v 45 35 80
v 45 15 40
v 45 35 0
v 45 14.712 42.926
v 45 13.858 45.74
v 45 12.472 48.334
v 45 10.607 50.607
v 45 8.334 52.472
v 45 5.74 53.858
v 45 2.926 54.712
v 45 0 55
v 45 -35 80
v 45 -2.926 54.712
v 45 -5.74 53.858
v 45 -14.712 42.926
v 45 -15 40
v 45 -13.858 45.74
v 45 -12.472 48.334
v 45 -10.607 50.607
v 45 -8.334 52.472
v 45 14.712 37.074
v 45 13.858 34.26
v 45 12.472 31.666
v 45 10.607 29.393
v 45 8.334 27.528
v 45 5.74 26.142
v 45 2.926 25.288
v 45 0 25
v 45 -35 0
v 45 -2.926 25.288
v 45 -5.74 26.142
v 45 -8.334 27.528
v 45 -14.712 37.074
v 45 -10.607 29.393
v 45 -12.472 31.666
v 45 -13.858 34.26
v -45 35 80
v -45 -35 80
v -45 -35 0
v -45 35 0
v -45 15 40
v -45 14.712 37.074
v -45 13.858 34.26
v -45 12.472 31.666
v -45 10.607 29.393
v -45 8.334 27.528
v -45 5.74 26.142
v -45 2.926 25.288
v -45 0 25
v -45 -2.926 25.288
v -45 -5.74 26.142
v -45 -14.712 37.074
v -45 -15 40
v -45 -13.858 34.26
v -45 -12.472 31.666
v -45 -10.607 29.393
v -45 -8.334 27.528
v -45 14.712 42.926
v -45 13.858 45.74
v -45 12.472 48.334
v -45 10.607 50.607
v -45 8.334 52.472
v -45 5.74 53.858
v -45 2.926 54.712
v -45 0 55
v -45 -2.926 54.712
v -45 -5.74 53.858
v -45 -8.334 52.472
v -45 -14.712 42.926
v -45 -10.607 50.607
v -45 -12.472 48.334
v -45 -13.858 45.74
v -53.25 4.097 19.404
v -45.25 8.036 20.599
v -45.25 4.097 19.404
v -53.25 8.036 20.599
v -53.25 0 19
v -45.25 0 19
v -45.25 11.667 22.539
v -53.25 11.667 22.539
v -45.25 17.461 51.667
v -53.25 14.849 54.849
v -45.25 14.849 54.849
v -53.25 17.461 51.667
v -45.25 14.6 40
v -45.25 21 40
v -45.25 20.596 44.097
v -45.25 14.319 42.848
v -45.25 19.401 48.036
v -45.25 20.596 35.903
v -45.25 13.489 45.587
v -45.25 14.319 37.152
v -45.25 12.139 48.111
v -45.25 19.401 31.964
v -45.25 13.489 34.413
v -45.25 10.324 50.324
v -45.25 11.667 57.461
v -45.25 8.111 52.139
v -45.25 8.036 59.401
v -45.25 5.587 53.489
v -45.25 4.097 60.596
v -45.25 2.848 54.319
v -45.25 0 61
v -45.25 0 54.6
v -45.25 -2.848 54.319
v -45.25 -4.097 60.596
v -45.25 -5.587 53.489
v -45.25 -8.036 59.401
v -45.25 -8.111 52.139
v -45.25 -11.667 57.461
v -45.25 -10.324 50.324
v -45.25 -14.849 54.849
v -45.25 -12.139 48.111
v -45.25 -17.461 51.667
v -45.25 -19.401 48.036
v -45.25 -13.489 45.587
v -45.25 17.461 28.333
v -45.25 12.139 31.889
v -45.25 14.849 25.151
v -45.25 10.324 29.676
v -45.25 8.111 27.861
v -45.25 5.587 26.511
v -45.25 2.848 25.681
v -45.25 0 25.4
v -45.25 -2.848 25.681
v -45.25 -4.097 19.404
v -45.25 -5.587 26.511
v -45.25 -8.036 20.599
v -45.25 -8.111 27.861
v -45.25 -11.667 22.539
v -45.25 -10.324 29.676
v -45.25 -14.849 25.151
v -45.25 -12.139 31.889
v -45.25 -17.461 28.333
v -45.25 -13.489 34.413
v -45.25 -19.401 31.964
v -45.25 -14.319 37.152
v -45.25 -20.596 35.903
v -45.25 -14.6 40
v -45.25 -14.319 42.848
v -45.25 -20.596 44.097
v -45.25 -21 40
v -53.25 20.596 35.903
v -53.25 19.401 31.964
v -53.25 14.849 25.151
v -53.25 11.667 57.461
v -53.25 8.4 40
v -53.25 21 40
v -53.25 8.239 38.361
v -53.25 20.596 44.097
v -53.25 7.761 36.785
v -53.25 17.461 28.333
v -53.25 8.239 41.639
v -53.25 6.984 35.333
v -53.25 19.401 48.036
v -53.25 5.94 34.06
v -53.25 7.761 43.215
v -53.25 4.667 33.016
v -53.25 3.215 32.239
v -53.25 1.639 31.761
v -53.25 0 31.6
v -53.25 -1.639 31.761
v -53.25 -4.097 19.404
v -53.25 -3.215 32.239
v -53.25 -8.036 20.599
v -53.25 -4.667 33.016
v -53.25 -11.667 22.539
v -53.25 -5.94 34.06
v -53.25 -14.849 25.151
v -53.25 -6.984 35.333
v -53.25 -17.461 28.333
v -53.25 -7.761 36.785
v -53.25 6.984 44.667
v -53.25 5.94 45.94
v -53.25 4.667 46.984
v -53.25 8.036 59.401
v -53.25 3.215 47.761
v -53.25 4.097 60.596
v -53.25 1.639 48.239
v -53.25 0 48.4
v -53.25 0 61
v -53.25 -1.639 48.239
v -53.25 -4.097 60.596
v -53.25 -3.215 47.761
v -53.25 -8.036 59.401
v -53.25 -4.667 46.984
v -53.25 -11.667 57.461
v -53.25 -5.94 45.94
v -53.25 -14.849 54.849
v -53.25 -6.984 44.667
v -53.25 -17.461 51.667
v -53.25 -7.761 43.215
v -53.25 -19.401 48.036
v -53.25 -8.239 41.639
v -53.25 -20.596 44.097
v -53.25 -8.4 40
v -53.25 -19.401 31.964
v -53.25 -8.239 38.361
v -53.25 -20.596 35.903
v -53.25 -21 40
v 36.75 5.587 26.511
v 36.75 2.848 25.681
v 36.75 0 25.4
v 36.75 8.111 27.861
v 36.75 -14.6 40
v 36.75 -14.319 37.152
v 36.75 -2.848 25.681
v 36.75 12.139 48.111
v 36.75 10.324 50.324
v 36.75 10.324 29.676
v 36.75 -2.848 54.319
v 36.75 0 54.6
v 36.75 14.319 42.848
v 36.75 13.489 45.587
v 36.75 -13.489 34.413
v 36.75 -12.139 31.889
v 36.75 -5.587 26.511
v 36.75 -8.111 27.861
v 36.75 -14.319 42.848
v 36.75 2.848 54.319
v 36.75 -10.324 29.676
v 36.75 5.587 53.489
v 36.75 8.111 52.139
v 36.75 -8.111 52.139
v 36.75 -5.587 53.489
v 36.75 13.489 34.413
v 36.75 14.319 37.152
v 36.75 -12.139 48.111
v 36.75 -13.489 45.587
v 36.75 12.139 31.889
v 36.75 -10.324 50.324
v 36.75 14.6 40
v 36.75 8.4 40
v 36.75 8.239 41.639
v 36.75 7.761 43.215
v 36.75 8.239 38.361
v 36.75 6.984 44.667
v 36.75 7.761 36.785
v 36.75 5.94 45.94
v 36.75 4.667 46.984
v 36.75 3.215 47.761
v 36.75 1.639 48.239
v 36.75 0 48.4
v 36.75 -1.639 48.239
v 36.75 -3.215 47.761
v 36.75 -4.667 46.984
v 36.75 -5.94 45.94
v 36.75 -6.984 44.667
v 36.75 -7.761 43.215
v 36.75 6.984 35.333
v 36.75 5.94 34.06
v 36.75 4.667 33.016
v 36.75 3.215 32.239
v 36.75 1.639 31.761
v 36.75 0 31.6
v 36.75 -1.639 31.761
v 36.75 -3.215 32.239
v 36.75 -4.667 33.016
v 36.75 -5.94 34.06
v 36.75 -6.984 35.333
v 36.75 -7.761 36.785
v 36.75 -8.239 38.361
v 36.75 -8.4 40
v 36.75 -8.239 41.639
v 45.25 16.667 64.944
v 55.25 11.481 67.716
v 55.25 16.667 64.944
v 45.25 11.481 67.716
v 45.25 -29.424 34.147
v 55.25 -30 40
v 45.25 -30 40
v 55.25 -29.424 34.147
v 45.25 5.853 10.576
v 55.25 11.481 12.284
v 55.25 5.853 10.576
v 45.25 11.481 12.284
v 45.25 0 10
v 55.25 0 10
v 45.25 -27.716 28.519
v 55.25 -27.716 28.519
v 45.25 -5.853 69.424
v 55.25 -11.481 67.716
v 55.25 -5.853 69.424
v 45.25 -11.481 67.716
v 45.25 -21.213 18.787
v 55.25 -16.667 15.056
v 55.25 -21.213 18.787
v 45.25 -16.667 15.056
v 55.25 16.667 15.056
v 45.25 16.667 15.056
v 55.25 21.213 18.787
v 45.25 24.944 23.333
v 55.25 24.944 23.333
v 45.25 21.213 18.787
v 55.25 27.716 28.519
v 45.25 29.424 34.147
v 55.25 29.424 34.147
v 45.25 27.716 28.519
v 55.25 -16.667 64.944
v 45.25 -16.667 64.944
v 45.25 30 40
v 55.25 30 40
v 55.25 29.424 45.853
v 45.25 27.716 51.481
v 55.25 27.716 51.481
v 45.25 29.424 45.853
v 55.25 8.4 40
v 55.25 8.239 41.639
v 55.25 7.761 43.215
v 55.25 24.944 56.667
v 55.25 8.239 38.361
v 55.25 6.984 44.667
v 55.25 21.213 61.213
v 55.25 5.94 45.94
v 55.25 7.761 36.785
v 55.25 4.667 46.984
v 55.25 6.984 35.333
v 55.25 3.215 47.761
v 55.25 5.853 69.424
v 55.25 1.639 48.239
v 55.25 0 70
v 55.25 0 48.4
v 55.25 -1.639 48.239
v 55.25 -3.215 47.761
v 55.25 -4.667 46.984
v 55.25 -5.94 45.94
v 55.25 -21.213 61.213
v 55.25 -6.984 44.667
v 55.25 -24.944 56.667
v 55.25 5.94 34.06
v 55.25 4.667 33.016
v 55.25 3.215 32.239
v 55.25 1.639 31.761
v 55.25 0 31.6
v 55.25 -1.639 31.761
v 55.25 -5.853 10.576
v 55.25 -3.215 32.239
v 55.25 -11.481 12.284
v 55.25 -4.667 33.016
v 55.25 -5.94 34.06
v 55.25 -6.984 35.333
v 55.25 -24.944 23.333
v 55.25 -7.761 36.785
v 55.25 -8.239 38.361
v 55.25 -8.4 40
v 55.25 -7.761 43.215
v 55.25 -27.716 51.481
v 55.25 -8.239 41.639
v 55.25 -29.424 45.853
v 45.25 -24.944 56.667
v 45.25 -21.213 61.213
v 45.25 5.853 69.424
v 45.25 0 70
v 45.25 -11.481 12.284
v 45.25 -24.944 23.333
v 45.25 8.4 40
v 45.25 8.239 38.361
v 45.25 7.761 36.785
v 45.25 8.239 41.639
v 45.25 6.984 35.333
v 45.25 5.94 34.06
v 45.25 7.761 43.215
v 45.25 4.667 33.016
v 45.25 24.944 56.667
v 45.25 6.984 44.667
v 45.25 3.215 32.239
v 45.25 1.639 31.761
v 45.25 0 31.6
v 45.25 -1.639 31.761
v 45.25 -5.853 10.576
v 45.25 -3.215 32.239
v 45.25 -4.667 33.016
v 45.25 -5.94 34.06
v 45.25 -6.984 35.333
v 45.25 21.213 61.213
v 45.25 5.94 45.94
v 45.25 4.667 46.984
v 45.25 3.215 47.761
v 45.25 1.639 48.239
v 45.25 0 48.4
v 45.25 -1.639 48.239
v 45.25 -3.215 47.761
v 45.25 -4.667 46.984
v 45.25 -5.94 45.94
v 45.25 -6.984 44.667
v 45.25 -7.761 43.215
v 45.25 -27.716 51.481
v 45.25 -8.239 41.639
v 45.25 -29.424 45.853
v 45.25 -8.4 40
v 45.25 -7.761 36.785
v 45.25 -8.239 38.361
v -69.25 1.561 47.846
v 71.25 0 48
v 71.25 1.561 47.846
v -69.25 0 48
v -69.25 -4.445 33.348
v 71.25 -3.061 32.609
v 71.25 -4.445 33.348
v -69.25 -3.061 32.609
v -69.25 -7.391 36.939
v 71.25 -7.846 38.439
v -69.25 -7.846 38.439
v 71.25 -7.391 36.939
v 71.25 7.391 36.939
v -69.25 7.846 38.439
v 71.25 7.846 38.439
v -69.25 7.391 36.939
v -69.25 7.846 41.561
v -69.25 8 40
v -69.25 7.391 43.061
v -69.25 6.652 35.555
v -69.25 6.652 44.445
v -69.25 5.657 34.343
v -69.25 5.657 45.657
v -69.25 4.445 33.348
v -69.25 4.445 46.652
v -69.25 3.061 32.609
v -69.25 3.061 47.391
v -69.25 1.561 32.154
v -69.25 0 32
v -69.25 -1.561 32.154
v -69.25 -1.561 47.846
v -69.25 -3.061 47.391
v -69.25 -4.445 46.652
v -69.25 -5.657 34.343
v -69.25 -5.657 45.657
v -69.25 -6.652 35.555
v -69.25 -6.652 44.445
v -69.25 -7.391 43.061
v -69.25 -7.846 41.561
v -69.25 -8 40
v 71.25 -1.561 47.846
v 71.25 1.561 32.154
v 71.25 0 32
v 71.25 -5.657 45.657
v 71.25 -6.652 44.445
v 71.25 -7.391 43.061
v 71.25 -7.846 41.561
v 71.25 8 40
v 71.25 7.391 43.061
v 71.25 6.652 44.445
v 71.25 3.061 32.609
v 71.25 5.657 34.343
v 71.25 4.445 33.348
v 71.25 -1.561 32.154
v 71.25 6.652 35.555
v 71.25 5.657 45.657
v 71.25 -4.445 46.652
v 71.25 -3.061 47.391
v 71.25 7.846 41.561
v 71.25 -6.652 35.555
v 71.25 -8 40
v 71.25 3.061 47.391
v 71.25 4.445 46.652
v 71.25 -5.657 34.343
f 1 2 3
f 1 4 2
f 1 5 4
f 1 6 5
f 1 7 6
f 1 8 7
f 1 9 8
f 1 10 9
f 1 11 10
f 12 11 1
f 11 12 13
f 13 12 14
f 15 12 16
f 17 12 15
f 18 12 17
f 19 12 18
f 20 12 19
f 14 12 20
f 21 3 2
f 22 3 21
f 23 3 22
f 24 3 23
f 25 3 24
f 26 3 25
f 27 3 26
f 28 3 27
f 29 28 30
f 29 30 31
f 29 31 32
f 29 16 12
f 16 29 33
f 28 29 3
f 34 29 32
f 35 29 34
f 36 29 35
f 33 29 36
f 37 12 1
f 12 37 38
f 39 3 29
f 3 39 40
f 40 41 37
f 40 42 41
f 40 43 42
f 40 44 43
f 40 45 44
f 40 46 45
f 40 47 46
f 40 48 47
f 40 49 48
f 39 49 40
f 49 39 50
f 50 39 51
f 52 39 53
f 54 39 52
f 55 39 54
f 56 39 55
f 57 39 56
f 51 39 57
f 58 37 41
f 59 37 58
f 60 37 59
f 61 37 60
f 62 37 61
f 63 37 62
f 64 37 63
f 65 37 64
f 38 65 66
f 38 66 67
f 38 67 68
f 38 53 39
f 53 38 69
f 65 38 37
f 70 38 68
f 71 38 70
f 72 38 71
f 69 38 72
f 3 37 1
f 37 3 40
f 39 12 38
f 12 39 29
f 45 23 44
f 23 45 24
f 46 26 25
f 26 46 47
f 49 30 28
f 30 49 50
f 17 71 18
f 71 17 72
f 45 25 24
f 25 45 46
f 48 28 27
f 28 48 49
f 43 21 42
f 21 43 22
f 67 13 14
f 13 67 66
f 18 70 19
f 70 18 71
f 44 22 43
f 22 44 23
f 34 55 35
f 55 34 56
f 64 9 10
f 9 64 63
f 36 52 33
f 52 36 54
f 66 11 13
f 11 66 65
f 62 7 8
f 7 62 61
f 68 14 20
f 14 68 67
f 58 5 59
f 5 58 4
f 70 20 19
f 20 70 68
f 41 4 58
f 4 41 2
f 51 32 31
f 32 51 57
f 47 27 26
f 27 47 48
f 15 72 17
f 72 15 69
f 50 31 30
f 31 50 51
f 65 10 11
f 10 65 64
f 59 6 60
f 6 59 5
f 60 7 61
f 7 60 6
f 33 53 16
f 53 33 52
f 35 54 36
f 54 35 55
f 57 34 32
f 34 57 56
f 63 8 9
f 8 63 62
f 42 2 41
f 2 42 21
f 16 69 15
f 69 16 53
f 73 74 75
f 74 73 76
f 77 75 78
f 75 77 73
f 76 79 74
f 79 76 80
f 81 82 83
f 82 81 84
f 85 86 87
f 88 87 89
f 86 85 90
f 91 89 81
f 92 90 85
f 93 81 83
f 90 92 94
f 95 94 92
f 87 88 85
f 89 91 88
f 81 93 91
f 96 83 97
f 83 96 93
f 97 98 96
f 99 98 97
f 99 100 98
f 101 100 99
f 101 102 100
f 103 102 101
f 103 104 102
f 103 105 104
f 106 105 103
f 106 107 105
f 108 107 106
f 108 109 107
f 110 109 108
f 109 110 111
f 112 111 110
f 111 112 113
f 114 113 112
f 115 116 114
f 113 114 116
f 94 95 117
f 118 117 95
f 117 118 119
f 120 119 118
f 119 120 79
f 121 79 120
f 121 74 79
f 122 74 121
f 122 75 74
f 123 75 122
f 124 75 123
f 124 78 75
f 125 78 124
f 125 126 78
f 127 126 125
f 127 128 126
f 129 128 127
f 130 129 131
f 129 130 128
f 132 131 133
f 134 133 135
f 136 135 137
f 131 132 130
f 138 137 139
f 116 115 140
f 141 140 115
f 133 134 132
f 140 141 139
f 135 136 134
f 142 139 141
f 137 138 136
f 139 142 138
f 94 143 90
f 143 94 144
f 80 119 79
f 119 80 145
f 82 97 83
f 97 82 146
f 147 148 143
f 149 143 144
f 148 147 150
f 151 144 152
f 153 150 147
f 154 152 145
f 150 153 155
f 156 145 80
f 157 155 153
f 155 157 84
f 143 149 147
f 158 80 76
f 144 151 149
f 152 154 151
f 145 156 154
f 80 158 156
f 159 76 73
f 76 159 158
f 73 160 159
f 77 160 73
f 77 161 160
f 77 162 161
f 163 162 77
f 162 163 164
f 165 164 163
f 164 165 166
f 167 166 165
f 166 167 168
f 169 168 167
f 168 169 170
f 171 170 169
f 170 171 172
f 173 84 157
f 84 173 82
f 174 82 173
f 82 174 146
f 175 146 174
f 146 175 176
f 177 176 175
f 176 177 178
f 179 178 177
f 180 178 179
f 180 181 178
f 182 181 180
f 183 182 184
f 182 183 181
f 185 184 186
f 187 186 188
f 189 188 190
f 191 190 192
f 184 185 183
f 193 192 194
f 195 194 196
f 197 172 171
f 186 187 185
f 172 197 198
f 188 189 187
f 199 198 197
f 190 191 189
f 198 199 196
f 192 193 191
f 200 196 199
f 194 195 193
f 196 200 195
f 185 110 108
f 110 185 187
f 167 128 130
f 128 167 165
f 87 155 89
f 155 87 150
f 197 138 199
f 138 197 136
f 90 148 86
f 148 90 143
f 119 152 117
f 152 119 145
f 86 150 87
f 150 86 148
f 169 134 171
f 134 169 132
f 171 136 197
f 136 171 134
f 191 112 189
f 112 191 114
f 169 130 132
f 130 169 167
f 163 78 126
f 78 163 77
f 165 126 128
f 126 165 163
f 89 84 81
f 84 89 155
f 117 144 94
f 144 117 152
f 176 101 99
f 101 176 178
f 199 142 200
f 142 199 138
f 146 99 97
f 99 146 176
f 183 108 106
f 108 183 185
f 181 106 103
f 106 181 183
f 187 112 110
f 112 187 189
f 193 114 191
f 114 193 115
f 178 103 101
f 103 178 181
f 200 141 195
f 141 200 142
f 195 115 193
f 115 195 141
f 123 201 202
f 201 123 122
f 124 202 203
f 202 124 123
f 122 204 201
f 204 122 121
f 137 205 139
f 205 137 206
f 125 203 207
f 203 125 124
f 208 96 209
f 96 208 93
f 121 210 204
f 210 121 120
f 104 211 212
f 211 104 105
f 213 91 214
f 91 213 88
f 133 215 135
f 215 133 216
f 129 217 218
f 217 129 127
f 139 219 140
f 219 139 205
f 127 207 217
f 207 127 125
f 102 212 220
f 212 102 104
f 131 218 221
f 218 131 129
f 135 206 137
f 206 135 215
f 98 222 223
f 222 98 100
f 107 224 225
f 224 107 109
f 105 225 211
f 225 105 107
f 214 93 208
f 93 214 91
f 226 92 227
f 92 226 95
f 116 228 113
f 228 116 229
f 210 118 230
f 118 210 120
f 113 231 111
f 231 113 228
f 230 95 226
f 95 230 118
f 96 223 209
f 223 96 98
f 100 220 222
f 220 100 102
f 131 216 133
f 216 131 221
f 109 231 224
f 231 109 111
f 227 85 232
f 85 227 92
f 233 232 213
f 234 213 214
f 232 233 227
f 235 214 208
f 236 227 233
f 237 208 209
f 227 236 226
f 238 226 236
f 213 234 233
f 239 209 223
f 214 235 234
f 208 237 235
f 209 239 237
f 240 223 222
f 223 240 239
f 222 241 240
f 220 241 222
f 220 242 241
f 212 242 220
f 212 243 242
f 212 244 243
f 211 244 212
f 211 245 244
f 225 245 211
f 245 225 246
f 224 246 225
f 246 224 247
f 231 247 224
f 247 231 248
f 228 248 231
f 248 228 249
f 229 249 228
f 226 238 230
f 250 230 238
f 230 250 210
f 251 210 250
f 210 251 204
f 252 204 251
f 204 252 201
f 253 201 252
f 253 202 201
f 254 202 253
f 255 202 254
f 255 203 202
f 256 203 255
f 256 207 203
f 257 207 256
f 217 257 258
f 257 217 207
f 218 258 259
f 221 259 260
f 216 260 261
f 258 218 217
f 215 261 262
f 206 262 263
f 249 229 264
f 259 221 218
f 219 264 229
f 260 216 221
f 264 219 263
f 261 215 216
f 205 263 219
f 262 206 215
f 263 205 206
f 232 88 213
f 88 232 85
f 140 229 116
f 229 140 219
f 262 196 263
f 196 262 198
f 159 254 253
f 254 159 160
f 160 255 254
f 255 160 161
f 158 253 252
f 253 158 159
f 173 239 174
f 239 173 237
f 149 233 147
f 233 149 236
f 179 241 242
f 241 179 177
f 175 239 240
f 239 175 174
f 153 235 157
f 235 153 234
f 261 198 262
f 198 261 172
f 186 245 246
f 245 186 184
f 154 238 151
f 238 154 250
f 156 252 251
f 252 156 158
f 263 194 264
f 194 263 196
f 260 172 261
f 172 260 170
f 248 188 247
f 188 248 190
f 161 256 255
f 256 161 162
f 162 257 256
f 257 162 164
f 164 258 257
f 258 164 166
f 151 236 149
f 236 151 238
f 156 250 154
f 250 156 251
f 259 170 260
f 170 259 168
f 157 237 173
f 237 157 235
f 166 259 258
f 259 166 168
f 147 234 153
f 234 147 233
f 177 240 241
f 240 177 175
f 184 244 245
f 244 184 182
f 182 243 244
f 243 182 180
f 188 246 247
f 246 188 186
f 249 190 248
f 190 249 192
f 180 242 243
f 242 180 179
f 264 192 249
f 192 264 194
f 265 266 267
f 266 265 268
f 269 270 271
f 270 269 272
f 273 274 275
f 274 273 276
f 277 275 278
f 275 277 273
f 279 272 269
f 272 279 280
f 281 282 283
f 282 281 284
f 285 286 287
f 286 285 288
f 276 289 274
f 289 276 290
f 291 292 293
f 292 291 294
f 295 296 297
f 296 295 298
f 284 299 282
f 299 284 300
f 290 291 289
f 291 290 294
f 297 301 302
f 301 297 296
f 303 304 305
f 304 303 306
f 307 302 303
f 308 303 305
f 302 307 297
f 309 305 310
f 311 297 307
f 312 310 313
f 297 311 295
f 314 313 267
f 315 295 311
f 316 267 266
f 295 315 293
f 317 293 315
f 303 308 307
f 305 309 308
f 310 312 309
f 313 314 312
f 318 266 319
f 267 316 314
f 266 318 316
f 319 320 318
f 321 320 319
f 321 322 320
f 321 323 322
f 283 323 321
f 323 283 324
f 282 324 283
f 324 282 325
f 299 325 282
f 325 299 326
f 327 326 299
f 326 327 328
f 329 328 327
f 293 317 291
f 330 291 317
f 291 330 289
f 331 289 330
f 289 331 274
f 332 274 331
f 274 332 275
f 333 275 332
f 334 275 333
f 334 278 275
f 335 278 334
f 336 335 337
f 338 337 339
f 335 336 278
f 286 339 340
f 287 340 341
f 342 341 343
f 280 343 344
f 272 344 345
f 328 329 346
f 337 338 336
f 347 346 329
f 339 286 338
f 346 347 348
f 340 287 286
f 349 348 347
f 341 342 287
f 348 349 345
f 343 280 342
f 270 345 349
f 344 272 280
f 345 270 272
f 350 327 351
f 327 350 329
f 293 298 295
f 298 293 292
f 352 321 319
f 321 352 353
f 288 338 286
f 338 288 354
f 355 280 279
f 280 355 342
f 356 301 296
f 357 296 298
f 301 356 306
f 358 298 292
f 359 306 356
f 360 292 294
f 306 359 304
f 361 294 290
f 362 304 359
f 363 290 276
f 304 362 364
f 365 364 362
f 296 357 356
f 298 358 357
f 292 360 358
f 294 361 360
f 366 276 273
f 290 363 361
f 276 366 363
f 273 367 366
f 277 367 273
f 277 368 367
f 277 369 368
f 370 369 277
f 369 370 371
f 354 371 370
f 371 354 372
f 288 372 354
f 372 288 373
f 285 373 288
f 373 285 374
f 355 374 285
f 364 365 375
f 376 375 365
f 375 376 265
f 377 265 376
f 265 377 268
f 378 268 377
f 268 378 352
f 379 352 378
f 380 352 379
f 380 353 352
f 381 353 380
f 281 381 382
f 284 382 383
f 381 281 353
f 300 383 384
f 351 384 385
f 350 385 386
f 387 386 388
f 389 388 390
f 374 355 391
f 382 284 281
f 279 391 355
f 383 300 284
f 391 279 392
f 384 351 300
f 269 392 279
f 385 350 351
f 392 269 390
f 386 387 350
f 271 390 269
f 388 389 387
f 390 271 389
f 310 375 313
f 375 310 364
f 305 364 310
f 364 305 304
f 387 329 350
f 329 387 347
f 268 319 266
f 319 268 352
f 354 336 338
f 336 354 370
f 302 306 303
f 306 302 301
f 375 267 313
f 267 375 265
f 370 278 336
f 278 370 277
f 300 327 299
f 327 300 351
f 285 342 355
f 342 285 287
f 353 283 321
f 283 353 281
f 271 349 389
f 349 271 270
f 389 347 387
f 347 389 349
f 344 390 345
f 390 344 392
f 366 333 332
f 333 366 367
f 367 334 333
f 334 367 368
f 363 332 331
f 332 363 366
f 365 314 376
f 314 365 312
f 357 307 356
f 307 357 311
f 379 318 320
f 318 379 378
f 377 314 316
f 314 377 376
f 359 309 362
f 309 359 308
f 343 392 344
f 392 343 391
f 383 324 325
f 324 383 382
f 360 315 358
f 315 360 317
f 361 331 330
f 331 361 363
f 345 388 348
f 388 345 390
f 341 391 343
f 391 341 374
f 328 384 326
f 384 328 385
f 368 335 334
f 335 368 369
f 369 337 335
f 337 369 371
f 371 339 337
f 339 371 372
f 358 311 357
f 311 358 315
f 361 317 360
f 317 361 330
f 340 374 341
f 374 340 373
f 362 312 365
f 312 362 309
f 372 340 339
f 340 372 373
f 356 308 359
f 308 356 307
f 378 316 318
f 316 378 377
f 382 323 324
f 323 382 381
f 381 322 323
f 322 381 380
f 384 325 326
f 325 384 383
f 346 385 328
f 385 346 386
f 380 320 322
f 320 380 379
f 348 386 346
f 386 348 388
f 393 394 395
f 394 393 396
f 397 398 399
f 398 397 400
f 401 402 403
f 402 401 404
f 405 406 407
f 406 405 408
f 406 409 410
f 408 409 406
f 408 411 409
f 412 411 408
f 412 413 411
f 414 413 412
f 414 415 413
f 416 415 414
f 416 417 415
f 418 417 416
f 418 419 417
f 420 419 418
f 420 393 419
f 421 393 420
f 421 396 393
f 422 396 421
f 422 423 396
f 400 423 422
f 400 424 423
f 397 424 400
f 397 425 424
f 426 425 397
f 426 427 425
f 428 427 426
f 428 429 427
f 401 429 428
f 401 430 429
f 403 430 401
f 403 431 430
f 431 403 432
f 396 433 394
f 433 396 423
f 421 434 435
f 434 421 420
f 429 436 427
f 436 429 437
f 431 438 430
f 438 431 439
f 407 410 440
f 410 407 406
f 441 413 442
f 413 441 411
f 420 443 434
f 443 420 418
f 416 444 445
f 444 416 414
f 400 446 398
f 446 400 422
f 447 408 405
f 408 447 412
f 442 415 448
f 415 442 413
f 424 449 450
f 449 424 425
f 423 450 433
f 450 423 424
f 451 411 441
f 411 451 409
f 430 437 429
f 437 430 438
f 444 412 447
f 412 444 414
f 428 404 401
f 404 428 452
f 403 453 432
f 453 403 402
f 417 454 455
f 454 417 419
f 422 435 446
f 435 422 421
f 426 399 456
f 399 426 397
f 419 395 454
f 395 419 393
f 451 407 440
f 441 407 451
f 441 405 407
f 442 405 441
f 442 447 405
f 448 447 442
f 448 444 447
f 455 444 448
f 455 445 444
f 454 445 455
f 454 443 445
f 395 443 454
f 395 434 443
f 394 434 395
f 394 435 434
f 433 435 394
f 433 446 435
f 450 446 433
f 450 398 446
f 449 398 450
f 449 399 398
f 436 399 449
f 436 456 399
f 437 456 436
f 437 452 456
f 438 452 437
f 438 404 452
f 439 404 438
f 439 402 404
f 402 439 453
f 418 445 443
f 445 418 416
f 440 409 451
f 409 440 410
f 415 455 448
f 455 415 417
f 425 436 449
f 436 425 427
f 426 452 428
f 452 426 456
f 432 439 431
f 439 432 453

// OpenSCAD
$fn = 32;

// ------------------------------------------------------------------------
// Bushed housing: 90 x 70 x 80 mm housing, bushing d29.2
// Every part is its own module, assembly() places them once.
// ------------------------------------------------------------------------

// --- part 1 ---
module housing() {
  difference() {
    translate([-45, -35, 0]) cube([90, 70, 80]);
    translate([0, 0, 40]) rotate([0, 90, 0]) cylinder(h = 92, d = 30, center = true);
  }
}

// --- part 2 ---
module bushing() {
  difference() {
    union() {
      cylinder(h = 8, d = 42);
      translate([0, 0, 8]) cylinder(h = 82, d = 29.2);
    }
    translate([0, 0, -1]) cylinder(h = 92, d = 16.8);
  }
}

// --- part 3 ---
module shaft() {
  translate([0, 0, -70.25]) cylinder(h = 140.5, d = 16);
}

// --- part 4 ---
module cover() {
  difference() {
    cylinder(h = 10, d = 60);
    translate([0, 0, -1]) cylinder(h = 12, d = 16.8);
  }
}

// --- assembly ---
module assembly() {
  translate([0, 0, 0]) rotate([0, 0, 0]) housing();
  translate([-53.25, 0, 40]) rotate([0, 90, 0]) bushing();
  translate([1, 0, 40]) rotate([0, 90, 0]) shaft();
  translate([45.25, 0, 40]) rotate([0, 90, 0]) cover();
}

assembly();
